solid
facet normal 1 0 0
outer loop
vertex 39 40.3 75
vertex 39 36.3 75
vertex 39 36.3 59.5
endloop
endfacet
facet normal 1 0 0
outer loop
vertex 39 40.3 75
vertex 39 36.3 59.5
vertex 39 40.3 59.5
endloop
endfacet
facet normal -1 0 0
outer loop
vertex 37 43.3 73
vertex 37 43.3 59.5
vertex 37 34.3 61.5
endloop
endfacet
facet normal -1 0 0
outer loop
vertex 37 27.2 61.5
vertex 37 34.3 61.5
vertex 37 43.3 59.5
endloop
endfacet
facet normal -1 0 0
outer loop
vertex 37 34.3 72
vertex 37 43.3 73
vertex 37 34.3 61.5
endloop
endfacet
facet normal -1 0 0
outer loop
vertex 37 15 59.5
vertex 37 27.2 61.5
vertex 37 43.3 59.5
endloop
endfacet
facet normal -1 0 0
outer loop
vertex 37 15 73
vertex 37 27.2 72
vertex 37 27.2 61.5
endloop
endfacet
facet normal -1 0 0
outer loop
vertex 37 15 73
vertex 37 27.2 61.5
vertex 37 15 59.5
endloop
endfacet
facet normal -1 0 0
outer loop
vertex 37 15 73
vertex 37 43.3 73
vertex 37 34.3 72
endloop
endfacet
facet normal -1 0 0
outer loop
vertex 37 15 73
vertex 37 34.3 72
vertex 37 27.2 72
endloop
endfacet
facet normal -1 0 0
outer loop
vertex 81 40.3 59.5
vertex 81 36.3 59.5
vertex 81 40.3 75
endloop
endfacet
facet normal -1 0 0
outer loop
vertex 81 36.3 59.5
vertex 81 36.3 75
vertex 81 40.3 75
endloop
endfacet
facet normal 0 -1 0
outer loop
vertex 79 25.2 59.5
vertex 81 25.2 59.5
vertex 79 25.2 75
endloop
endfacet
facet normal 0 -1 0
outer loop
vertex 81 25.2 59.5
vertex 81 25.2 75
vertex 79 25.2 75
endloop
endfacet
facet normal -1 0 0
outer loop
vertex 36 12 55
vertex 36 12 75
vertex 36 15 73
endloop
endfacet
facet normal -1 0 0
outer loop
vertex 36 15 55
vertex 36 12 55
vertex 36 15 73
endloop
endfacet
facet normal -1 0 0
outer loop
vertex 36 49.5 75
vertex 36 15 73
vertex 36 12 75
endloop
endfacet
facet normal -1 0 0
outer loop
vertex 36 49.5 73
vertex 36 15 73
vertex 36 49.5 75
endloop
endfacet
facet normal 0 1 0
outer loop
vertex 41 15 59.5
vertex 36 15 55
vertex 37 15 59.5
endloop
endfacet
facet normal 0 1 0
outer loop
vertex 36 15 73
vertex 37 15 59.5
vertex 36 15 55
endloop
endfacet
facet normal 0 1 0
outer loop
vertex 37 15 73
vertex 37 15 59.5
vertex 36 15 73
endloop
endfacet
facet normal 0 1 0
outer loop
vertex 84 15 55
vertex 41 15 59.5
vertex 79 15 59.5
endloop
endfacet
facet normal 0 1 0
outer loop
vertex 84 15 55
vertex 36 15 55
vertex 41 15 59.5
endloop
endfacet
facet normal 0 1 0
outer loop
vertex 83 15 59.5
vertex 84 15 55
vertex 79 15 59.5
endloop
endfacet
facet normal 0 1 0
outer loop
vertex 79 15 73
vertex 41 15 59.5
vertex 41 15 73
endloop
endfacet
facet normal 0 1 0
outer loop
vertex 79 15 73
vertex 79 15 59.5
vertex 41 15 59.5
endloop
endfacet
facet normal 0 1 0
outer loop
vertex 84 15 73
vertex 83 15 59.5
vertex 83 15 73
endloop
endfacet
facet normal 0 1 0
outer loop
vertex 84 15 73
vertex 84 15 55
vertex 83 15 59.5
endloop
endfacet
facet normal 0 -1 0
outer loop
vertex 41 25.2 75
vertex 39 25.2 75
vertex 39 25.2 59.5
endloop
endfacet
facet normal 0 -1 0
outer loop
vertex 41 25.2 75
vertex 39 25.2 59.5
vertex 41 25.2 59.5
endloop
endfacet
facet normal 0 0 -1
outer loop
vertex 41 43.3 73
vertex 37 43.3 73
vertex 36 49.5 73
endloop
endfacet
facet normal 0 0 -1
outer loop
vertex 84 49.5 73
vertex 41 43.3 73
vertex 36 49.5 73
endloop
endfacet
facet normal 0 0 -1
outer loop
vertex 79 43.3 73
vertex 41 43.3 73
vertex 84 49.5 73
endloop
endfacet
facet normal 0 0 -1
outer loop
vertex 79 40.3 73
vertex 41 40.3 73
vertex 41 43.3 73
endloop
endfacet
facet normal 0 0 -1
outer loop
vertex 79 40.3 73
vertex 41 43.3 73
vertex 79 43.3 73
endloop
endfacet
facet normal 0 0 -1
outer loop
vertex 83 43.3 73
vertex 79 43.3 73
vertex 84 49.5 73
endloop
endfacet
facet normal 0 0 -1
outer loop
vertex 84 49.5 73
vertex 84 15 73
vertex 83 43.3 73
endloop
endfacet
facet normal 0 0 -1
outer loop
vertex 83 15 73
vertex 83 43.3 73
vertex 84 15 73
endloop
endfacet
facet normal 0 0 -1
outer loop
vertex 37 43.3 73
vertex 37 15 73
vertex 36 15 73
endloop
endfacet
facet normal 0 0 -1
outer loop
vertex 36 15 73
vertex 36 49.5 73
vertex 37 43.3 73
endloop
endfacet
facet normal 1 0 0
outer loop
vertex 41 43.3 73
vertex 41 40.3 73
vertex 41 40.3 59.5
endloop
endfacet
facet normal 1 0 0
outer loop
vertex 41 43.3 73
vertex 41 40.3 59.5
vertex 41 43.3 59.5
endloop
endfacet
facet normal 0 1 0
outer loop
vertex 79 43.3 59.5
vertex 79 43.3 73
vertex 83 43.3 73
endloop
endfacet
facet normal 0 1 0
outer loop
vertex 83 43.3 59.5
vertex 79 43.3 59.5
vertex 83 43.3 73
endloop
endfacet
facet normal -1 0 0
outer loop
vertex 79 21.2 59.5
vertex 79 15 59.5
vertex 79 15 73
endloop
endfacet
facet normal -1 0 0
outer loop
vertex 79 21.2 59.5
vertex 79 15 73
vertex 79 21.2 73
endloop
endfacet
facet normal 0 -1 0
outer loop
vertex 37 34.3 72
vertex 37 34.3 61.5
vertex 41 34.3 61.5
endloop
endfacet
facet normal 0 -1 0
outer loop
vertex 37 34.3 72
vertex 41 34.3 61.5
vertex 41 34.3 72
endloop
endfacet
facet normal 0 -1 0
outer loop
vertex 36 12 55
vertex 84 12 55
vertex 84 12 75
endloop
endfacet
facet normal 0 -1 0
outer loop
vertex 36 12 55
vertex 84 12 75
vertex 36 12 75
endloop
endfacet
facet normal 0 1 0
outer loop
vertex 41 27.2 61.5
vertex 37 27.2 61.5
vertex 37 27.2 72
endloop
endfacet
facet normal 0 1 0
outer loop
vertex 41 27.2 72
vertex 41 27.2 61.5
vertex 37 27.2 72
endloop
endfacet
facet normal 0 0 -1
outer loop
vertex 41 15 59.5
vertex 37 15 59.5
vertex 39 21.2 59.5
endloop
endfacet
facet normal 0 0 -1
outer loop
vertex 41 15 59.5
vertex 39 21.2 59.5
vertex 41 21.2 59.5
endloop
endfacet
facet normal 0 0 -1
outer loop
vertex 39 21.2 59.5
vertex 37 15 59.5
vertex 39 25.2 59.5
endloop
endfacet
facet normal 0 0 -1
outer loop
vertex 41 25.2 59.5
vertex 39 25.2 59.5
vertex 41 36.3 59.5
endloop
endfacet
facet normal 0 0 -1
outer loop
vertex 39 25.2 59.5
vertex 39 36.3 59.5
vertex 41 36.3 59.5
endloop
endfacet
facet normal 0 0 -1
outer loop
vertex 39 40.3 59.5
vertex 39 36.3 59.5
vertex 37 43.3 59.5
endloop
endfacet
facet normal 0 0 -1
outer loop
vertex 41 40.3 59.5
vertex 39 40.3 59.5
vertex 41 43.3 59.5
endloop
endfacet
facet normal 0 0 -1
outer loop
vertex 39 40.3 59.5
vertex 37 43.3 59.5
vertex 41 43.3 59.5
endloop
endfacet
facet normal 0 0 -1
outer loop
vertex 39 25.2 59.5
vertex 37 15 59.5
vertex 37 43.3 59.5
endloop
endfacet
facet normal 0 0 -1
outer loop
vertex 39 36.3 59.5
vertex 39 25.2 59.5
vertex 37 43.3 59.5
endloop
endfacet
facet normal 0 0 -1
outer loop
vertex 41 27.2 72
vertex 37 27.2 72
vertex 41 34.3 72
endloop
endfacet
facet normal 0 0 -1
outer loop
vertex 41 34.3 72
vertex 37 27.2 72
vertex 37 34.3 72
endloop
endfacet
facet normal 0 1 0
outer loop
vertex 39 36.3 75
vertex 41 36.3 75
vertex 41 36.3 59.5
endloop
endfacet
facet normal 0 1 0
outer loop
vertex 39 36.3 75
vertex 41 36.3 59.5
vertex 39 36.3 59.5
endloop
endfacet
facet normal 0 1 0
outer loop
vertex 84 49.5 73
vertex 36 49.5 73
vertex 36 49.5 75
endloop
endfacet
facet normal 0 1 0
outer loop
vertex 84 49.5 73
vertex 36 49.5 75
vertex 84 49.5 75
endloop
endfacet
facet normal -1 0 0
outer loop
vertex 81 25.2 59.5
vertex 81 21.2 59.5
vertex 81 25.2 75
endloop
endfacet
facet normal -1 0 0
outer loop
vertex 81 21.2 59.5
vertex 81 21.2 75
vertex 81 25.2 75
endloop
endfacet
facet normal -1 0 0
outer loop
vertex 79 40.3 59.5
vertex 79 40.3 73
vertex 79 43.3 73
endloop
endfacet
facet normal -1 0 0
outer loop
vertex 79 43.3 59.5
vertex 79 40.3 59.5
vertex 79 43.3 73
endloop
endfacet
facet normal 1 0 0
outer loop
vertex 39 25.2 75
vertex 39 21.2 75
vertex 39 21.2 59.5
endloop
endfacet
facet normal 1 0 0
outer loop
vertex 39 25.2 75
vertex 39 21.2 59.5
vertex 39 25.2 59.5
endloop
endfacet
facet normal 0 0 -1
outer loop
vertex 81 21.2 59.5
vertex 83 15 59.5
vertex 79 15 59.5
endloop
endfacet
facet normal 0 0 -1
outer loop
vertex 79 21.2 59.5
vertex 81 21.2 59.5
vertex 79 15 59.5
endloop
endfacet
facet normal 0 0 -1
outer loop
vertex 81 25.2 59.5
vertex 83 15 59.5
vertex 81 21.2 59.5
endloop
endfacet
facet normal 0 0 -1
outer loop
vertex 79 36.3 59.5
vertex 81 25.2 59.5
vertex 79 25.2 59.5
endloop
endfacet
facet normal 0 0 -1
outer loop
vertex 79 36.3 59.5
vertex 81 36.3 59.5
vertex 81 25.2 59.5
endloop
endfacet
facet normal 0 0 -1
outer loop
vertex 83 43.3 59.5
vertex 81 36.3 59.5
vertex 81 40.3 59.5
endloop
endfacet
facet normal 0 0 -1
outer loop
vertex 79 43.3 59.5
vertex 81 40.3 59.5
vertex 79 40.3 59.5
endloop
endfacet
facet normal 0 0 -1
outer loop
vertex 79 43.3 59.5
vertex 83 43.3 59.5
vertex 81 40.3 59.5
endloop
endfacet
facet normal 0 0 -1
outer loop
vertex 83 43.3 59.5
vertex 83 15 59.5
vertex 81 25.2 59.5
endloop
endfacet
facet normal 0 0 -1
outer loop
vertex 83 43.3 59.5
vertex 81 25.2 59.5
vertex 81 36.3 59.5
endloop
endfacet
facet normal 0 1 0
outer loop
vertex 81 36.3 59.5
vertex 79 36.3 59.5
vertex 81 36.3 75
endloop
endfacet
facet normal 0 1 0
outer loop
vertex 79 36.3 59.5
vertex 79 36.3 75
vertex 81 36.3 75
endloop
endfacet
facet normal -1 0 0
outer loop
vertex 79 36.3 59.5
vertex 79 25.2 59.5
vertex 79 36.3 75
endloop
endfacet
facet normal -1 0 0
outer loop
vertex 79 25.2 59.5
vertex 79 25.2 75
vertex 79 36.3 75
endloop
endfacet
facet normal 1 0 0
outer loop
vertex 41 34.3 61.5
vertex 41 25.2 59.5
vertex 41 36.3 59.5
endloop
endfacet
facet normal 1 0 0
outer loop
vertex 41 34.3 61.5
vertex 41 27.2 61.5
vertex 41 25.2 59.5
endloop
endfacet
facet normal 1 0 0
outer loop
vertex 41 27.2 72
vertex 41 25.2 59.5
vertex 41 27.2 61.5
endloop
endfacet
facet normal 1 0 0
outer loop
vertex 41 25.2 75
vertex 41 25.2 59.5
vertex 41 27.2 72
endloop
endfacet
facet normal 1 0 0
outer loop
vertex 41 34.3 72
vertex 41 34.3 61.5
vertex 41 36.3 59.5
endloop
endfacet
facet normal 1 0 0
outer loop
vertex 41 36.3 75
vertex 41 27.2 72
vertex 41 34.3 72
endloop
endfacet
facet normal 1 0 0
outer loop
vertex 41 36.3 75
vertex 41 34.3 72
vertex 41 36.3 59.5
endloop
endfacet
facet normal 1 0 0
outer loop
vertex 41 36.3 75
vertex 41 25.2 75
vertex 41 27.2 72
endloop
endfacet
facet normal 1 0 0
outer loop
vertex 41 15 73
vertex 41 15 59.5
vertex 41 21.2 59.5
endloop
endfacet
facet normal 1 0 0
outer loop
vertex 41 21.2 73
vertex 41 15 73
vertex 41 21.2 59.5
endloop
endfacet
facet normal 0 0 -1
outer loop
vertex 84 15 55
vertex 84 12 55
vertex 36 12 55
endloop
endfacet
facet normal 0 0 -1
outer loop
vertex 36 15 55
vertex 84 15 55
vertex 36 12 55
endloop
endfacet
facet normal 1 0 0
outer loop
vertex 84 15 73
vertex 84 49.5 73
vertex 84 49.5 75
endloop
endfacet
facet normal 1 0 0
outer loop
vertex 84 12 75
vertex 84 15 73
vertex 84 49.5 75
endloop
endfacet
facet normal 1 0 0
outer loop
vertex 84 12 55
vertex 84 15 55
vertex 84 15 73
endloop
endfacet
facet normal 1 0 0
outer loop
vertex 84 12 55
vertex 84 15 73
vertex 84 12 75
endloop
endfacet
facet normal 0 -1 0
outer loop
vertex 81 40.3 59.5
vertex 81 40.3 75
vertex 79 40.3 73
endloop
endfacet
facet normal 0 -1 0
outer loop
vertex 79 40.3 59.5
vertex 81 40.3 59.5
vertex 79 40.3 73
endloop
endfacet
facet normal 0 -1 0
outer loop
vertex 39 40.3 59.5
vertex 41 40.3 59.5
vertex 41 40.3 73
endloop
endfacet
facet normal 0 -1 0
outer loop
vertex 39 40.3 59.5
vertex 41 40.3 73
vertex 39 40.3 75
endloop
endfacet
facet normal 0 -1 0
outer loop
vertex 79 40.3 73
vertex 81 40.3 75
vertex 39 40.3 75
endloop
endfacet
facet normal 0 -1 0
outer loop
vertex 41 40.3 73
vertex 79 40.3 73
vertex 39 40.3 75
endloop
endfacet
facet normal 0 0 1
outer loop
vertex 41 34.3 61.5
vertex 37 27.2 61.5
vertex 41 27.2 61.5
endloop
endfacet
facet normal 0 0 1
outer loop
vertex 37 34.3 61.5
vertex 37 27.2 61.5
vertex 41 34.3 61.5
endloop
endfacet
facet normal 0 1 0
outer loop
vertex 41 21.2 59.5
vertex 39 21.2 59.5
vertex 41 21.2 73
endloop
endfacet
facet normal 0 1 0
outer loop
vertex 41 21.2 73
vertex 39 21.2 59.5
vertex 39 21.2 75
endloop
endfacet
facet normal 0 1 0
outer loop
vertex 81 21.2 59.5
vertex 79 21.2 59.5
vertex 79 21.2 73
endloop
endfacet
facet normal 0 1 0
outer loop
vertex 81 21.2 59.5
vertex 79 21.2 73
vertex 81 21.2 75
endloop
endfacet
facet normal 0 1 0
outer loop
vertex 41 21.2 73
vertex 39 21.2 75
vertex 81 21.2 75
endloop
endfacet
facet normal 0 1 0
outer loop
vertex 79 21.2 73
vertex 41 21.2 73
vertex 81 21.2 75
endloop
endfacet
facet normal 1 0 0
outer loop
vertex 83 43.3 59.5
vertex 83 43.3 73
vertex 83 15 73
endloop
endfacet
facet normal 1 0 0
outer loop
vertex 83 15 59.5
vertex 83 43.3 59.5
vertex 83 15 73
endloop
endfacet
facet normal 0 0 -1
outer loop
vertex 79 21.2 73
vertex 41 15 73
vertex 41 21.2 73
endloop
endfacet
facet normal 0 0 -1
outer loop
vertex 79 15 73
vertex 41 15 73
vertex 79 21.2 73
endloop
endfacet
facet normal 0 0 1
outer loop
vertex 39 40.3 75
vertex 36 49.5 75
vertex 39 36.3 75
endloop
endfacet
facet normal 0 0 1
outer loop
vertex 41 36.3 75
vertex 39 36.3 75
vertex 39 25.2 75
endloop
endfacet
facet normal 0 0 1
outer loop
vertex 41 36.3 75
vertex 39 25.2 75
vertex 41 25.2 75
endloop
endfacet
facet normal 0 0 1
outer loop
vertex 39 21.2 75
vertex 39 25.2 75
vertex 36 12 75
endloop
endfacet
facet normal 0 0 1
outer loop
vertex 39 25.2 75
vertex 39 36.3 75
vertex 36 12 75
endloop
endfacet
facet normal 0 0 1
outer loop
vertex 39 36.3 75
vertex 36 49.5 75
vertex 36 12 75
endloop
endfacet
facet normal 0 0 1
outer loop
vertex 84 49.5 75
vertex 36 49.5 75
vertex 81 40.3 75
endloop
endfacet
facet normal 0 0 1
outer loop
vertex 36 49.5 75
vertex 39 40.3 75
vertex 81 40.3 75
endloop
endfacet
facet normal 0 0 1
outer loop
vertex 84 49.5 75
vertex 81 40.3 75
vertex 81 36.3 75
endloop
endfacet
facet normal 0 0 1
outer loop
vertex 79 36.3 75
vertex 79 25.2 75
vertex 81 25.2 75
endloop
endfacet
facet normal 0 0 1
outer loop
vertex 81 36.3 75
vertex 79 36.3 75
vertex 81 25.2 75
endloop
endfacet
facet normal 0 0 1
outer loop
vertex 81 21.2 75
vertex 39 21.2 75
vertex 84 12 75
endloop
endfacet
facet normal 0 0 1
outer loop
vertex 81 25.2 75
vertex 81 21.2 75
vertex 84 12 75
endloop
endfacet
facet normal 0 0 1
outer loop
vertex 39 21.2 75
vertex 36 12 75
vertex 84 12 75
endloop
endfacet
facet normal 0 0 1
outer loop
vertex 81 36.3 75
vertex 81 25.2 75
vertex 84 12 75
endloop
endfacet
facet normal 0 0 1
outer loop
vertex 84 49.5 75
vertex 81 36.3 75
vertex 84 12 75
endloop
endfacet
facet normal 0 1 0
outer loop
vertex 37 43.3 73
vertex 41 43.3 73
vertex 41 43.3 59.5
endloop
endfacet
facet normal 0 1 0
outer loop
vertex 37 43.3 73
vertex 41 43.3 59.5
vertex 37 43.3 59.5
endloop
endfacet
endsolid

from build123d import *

# Parameters (mm, degrees)
SKETCH2_W                = 200
SKETCH2_H                = 150
BOSS_EXTRUDE1_DEPTH      = 80
FILLET1_R                = 10
SHELL1_T                 = -2
SHELL1_THICKNESS_2_DEPTH = 13
SKETCH5_W                = 36.5
SKETCH5_H                = 27.5
CUT_EXTRUDE1_DEPTH       = 2
BOSS_EXTRUDE2_DEPTH      = 16
SKETCH7_W                = 36.5
SKETCH7_H                = 27.5
CUT_EXTRUDE2_DEPTH       = 2
BOSS_EXTRUDE3_DEPTH      = 16
SKETCH10_W               = 36.5
SKETCH10_H               = 27.5
CUT_EXTRUDE4_DEPTH       = 2
BOSS_EXTRUDE4_DEPTH      = 16
SKETCH13_W               = 2
SKETCH13_H               = 4
CUT_EXTRUDE5_DEPTH       = 2
BOSS_EXTRUDE5_DEPTH      = 13.5
SKETCH15_W               = 10.5
SKETCH15_H               = 7.1
CUT_EXTRUDE6_DEPTH       = 4
CUT_EXTRUDE8_REACH       = 150.408
SKETCH20_R               = 8
SPLIT1_SURFACE_1_BACK    = 263.488
SPLIT1_SURFACE_1_DEPTH   = 526.976
SPLIT1_SURFACE_2_BACK    = 263.488
SPLIT1_SURFACE_2_DEPTH   = 526.976
SPLIT2_SURFACE_3_BACK    = 263.488
SPLIT2_SURFACE_3_DEPTH   = 526.976
SPLIT2_SURFACE_4_BACK    = 263.488
SPLIT2_SURFACE_4_DEPTH   = 526.976


with BuildPart() as part:
    # Sketch2 → Boss-Extrude1 (new body)
    with BuildSketch(Plane(origin=(0, 0, 0), x_dir=(1, 0, 0), z_dir=(0, 1, 0))):
        Rectangle(SKETCH2_W, SKETCH2_H)
    extrude(amount=BOSS_EXTRUDE1_DEPTH)

    # Fillet1
    fillet1_edges = [part.edges().sort_by_distance(p)[0] for p in [
        (100, 40, 75),
        (-100, 40, 75),
        (-100, 40, -75),
        (100, 40, -75),
    ]]
    fillet(fillet1_edges, radius=FILLET1_R)

    # Shell1
    shell1_openings = [part.faces().sort_by_distance(p)[0] for p in [
        (0, 80, 0),
    ]]
    offset(amount=SHELL1_T, openings=shell1_openings, kind=Kind.INTERSECTION)

    # Shell1 thickness 2 face (on inner face of the shell) → Shell1 thickness 2 (add)
    with BuildSketch(Plane(origin=(0, 2, 0), x_dir=(0, 0, -1), z_dir=(0, -1, 0))):
        with BuildLine():
            ThreePointArc((73, -90), (70.656854249, -95.656854249), (65, -98))
            Line((65, -98), (-65, -98))
            ThreePointArc((-65, -98), (-70.656854249, -95.656854249), (-73, -90))
            Line((-73, -90), (-73, 90))
            ThreePointArc((-73, 90), (-70.656854249, 95.656854249), (-65, 98))
            Line((-65, 98), (65, 98))
            ThreePointArc((65, 98), (70.656854249, 95.656854249), (73, 90))
            Line((73, 90), (73, -90))
        make_face()
    extrude(amount=-SHELL1_THICKNESS_2_DEPTH)

    # Sketch5 → Cut-Extrude1 (cut)
    with BuildSketch(Plane.XY.offset(75)):
        with Locations((0, 30.75)):
            Rectangle(SKETCH5_W, SKETCH5_H)
        Polygon((-18.25, 43.5), (-19.75, 44.366025404), (-19.75, 41.633974596), (-18.25, 42.5), align=None)
        Polygon((-19.75, 19.866025404), (-18.25, 19), (-18.25, 18), (-19.75, 17.133974596), align=None)
        Polygon((19.75, 17.133974596), (19.75, 19.866025404), (18.25, 19), (18.25, 18), align=None)
        Polygon((19.75, 41.633974596), (18.25, 42.5), (18.25, 43.5), (19.75, 44.366025404), align=None)
    extrude(amount=-CUT_EXTRUDE1_DEPTH, mode=Mode.SUBTRACT)

    # Sketch6 → Boss-Extrude2 (add)
    with BuildSketch(Plane(origin=(0, 0, 73), x_dir=(-1, 0, 0), z_dir=(0, 0, -1))):
        Polygon((18.25, 15), (21.25, 15), (21.25, 47.5), (18.25, 47.5), (18.25, 43.5), (19.75, 44.366025404), (19.75, 41.633974596), (18.25, 42.5), (18.25, 19), (19.75, 19.866025404), (19.75, 17.133974596), (18.25, 18), align=None)
        Polygon((-21.25, 47.5), (-21.25, 15), (-18.25, 15), (-18.25, 18), (-19.75, 17.133974596), (-19.75, 19.866025404), (-18.25, 19), (-18.25, 42.5), (-19.75, 41.633974596), (-19.75, 44.366025404), (-18.25, 43.5), (-18.25, 47.5), align=None)
    extrude(amount=BOSS_EXTRUDE2_DEPTH)

    # Sketch7 → Cut-Extrude2 (cut)
    with BuildSketch(Plane(origin=(100, 0, 0), x_dir=(0, 0, -1), z_dir=(1, 0, 0))):
        with Locations((0, 30.75)):
            Rectangle(SKETCH7_W, SKETCH7_H)
        Polygon((-18.25, 43.5), (-19.75, 44.366025404), (-19.75, 41.633974596), (-18.25, 42.5), align=None)
        Polygon((-19.75, 19.866025404), (-18.25, 19), (-18.25, 18), (-19.75, 17.133974596), align=None)
        Polygon((19.75, 17.133974596), (19.75, 19.866025404), (18.25, 19), (18.25, 18), align=None)
        Polygon((19.75, 41.633974596), (18.25, 42.5), (18.25, 43.5), (19.75, 44.366025404), align=None)
    extrude(amount=-CUT_EXTRUDE2_DEPTH, mode=Mode.SUBTRACT)

    # Sketch8 → Boss-Extrude3 (add)
    with BuildSketch(Plane.ZY.offset(-98)):
        Polygon((-21.25, 47.5), (-18.25, 47.5), (-18.25, 43.5), (-19.75, 44.366025404), (-19.75, 41.633974596), (-18.25, 42.5), (-18.25, 19), (-19.75, 19.866025404), (-19.75, 17.133974596), (-18.25, 18), (-18.25, 15), (-21.25, 15), align=None)
        Polygon((19.75, 44.366025404), (18.25, 43.5), (18.25, 47.5), (21.25, 47.5), (21.25, 15), (18.25, 15), (18.25, 18), (19.75, 17.133974596), (19.75, 19.866025404), (18.25, 19), (18.25, 42.5), (19.75, 41.633974596), align=None)
    extrude(amount=BOSS_EXTRUDE3_DEPTH)

    # Sketch10 → Cut-Extrude4 (cut)
    with BuildSketch(Plane.ZY.offset(100)):
        with Locations((0, 30.75)):
            Rectangle(SKETCH10_W, SKETCH10_H)
        Polygon((-18.25, 43.5), (-19.75, 44.366025404), (-19.75, 41.633974596), (-18.25, 42.5), align=None)
        Polygon((-19.75, 19.866025404), (-18.25, 19), (-18.25, 18), (-19.75, 17.133974596), align=None)
        Polygon((19.75, 17.133974596), (19.75, 19.866025404), (18.25, 19), (18.25, 18), align=None)
        Polygon((19.75, 41.633974596), (18.25, 42.5), (18.25, 43.5), (19.75, 44.366025404), align=None)
    extrude(amount=-CUT_EXTRUDE4_DEPTH, mode=Mode.SUBTRACT)

    # Sketch11 → Boss-Extrude4 (add)
    with BuildSketch(Plane(origin=(-98, 0, 0), x_dir=(0, 0, -1), z_dir=(1, 0, 0))):
        Polygon((-18.25, 47.5), (-21.25, 47.5), (-21.25, 15), (-18.25, 15), (-18.25, 18), (-19.75, 17.133974596), (-19.75, 19.866025404), (-18.25, 19), (-18.25, 42.5), (-19.75, 41.633974596), (-19.75, 44.366025404), (-18.25, 43.5), align=None)
        Polygon((19.75, 44.366025404), (18.25, 43.5), (18.25, 47.5), (21.25, 47.5), (21.25, 15), (18.25, 15), (18.25, 18), (19.75, 17.133974596), (19.75, 19.866025404), (18.25, 19), (18.25, 42.5), (19.75, 41.633974596), align=None)
    extrude(amount=BOSS_EXTRUDE4_DEPTH)

    # Sketch13 → Cut-Extrude5 (cut)
    with BuildSketch(Plane.XY.offset(75)):
        with Locations((40, 38.3)):
            Rectangle(SKETCH13_W, SKETCH13_H)
        Polygon((79, 40.3), (41, 40.3), (41, 36.3), (41, 25.2), (41, 21.2), (79, 21.2), (79, 25.2), (79, 36.3), align=None)
        with Locations((80, 38.3)):
            Rectangle(SKETCH13_W, SKETCH13_H)
        with Locations((40, 23.2)):
            Rectangle(SKETCH13_W, SKETCH13_H)
        with Locations((80, 23.2)):
            Rectangle(SKETCH13_W, SKETCH13_H)
    extrude(amount=-CUT_EXTRUDE5_DEPTH, mode=Mode.SUBTRACT)

    # Sketch14 → Boss-Extrude5 (add)
    with BuildSketch(Plane(origin=(0, 0, 73), x_dir=(-1, 0, 0), z_dir=(0, 0, -1))):
        Polygon((-79, 43.3), (-83, 43.3), (-83, 15), (-79, 15), (-79, 21.2), (-81, 21.2), (-81, 25.2), (-79, 25.2), (-79, 36.3), (-81, 36.3), (-81, 40.3), (-79, 40.3), align=None)
        Polygon((-39, 40.3), (-41, 40.3), (-41, 43.3), (-37, 43.3), (-37, 15), (-41, 15), (-41, 21.2), (-39, 21.2), (-39, 25.2), (-41, 25.2), (-41, 36.3), (-39, 36.3), align=None)
    extrude(amount=BOSS_EXTRUDE5_DEPTH)

    # Sketch15 → Cut-Extrude6 (cut)
    with BuildSketch(Plane.ZY.offset(-37)):
        with Locations((66.75, 30.75)):
            Rectangle(SKETCH15_W, SKETCH15_H)
    extrude(amount=-CUT_EXTRUDE6_DEPTH, mode=Mode.SUBTRACT)

    # Sketch18 → Cut-Revolve1 (revolve, cut)
    with BuildSketch(Plane(origin=(0, 0, 0), x_dir=(0, 0, -1), z_dir=(1, 0, 0)), mode=Mode.PRIVATE) as cut_revolve1_sk:
        Polygon((-42.5, 0), (-70, 0), (-47.5, 10), (-42.5, 10), align=None)
    revolve(cut_revolve1_sk.sketch.rotate(Axis((0, 0, 0), (0, 1, 0)), 180), axis=Axis((0, 0, 0), (0, 1, 0)), mode=Mode.SUBTRACT)

    # Cut-Extrude8: up to this face of the body (flat: up to its plane)
    cut_extrude8_end = Plane(part.part.faces().sort_by_distance((-0.230072279, 15, -0.475589226))[0])
    # Sketch20 → Cut-Extrude8 (cut, up to the picked face)
    with BuildSketch(Plane.XZ, mode=Mode.PRIVATE) as cut_extrude8_sk1:
        with Locations(Location((0, -42.5, 0), (0, 0, 270))):
            Circle(SKETCH20_R)
    cut_extrude8_tool1 = split(extrude(cut_extrude8_sk1.sketch, amount=-CUT_EXTRUDE8_REACH, mode=Mode.PRIVATE), bisect_by=cut_extrude8_end, keep=Keep.BOTH, mode=Mode.PRIVATE)
    add(cut_extrude8_tool1.solids().sort_by(Axis((0, 0, -42.5), (0, 1, 0)))[0], mode=Mode.SUBTRACT)


with BuildPart() as body_2:
    # Split1: the piece behind the surface
    add(part.part)
    # Split1 surface: a surface, the sketch's curves swept straight by 526.976 mm
    with BuildLine(Plane.XY.offset(75).offset(-SPLIT1_SURFACE_1_BACK), mode=Mode.PRIVATE) as split1_surface_1_path:
        Line((36, 49.5), (84, 49.5))
        Line((84, 49.5), (84, 12))
        Line((84, 12), (36, 12))
        Line((36, 12), (36, 49.5))
    split1_surface_1 = Shell.extrude(split1_surface_1_path.wire(), (0 * SPLIT1_SURFACE_1_DEPTH, 0 * SPLIT1_SURFACE_1_DEPTH, 1 * SPLIT1_SURFACE_1_DEPTH))
    split(bisect_by=split1_surface_1, keep=Keep.BOTTOM)


with BuildPart() as part_1:
    add(part.part)

    # Split1: split by a surface, the side it looks to stays
    # Split1 surface: a surface, the sketch's curves swept straight by 526.976 mm
    with BuildLine(Plane.XY.offset(75).offset(-SPLIT1_SURFACE_2_BACK), mode=Mode.PRIVATE) as split1_surface_2_path:
        Line((36, 49.5), (84, 49.5))
        Line((84, 49.5), (84, 12))
        Line((84, 12), (36, 12))
        Line((36, 12), (36, 49.5))
    split1_surface_2 = Shell.extrude(split1_surface_2_path.wire(), (0 * SPLIT1_SURFACE_2_DEPTH, 0 * SPLIT1_SURFACE_2_DEPTH, 1 * SPLIT1_SURFACE_2_DEPTH))
    split(bisect_by=split1_surface_2, keep=Keep.TOP)


with BuildPart() as body_3:
    # Split2: the piece behind the surface
    add(body_2.part)
    # Split2 surface: a surface, the sketch's curves swept straight by 526.976 mm
    with BuildLine(Plane(origin=(0, 15, 0), x_dir=(1, 0, 0), z_dir=(0, 1, 0)).offset(-SPLIT2_SURFACE_3_BACK), mode=Mode.PRIVATE) as split2_surface_3_path:
        Line((36, -75), (84, -75))
        Line((84, -75), (84, -55))
        Line((84, -55), (36, -55))
        Line((36, -55), (36, -75))
    split2_surface_3 = Shell.extrude(split2_surface_3_path.wire(), (0 * SPLIT2_SURFACE_3_DEPTH, 1 * SPLIT2_SURFACE_3_DEPTH, 0 * SPLIT2_SURFACE_3_DEPTH))
    split(bisect_by=split2_surface_3, keep=Keep.BOTTOM)


with BuildPart() as body_2_1:
    add(body_2.part)

    # Split2: split by a surface, the side it looks to stays
    # Split2 surface: a surface, the sketch's curves swept straight by 526.976 mm
    with BuildLine(Plane(origin=(0, 15, 0), x_dir=(1, 0, 0), z_dir=(0, 1, 0)).offset(-SPLIT2_SURFACE_4_BACK), mode=Mode.PRIVATE) as split2_surface_4_path:
        Line((36, -75), (84, -75))
        Line((84, -75), (84, -55))
        Line((84, -55), (36, -55))
        Line((36, -55), (36, -75))
    split2_surface_4 = Shell.extrude(split2_surface_4_path.wire(), (0 * SPLIT2_SURFACE_4_DEPTH, 1 * SPLIT2_SURFACE_4_DEPTH, 0 * SPLIT2_SURFACE_4_DEPTH))
    split(bisect_by=split2_surface_4, keep=Keep.TOP)


solid = body_2_1.part
